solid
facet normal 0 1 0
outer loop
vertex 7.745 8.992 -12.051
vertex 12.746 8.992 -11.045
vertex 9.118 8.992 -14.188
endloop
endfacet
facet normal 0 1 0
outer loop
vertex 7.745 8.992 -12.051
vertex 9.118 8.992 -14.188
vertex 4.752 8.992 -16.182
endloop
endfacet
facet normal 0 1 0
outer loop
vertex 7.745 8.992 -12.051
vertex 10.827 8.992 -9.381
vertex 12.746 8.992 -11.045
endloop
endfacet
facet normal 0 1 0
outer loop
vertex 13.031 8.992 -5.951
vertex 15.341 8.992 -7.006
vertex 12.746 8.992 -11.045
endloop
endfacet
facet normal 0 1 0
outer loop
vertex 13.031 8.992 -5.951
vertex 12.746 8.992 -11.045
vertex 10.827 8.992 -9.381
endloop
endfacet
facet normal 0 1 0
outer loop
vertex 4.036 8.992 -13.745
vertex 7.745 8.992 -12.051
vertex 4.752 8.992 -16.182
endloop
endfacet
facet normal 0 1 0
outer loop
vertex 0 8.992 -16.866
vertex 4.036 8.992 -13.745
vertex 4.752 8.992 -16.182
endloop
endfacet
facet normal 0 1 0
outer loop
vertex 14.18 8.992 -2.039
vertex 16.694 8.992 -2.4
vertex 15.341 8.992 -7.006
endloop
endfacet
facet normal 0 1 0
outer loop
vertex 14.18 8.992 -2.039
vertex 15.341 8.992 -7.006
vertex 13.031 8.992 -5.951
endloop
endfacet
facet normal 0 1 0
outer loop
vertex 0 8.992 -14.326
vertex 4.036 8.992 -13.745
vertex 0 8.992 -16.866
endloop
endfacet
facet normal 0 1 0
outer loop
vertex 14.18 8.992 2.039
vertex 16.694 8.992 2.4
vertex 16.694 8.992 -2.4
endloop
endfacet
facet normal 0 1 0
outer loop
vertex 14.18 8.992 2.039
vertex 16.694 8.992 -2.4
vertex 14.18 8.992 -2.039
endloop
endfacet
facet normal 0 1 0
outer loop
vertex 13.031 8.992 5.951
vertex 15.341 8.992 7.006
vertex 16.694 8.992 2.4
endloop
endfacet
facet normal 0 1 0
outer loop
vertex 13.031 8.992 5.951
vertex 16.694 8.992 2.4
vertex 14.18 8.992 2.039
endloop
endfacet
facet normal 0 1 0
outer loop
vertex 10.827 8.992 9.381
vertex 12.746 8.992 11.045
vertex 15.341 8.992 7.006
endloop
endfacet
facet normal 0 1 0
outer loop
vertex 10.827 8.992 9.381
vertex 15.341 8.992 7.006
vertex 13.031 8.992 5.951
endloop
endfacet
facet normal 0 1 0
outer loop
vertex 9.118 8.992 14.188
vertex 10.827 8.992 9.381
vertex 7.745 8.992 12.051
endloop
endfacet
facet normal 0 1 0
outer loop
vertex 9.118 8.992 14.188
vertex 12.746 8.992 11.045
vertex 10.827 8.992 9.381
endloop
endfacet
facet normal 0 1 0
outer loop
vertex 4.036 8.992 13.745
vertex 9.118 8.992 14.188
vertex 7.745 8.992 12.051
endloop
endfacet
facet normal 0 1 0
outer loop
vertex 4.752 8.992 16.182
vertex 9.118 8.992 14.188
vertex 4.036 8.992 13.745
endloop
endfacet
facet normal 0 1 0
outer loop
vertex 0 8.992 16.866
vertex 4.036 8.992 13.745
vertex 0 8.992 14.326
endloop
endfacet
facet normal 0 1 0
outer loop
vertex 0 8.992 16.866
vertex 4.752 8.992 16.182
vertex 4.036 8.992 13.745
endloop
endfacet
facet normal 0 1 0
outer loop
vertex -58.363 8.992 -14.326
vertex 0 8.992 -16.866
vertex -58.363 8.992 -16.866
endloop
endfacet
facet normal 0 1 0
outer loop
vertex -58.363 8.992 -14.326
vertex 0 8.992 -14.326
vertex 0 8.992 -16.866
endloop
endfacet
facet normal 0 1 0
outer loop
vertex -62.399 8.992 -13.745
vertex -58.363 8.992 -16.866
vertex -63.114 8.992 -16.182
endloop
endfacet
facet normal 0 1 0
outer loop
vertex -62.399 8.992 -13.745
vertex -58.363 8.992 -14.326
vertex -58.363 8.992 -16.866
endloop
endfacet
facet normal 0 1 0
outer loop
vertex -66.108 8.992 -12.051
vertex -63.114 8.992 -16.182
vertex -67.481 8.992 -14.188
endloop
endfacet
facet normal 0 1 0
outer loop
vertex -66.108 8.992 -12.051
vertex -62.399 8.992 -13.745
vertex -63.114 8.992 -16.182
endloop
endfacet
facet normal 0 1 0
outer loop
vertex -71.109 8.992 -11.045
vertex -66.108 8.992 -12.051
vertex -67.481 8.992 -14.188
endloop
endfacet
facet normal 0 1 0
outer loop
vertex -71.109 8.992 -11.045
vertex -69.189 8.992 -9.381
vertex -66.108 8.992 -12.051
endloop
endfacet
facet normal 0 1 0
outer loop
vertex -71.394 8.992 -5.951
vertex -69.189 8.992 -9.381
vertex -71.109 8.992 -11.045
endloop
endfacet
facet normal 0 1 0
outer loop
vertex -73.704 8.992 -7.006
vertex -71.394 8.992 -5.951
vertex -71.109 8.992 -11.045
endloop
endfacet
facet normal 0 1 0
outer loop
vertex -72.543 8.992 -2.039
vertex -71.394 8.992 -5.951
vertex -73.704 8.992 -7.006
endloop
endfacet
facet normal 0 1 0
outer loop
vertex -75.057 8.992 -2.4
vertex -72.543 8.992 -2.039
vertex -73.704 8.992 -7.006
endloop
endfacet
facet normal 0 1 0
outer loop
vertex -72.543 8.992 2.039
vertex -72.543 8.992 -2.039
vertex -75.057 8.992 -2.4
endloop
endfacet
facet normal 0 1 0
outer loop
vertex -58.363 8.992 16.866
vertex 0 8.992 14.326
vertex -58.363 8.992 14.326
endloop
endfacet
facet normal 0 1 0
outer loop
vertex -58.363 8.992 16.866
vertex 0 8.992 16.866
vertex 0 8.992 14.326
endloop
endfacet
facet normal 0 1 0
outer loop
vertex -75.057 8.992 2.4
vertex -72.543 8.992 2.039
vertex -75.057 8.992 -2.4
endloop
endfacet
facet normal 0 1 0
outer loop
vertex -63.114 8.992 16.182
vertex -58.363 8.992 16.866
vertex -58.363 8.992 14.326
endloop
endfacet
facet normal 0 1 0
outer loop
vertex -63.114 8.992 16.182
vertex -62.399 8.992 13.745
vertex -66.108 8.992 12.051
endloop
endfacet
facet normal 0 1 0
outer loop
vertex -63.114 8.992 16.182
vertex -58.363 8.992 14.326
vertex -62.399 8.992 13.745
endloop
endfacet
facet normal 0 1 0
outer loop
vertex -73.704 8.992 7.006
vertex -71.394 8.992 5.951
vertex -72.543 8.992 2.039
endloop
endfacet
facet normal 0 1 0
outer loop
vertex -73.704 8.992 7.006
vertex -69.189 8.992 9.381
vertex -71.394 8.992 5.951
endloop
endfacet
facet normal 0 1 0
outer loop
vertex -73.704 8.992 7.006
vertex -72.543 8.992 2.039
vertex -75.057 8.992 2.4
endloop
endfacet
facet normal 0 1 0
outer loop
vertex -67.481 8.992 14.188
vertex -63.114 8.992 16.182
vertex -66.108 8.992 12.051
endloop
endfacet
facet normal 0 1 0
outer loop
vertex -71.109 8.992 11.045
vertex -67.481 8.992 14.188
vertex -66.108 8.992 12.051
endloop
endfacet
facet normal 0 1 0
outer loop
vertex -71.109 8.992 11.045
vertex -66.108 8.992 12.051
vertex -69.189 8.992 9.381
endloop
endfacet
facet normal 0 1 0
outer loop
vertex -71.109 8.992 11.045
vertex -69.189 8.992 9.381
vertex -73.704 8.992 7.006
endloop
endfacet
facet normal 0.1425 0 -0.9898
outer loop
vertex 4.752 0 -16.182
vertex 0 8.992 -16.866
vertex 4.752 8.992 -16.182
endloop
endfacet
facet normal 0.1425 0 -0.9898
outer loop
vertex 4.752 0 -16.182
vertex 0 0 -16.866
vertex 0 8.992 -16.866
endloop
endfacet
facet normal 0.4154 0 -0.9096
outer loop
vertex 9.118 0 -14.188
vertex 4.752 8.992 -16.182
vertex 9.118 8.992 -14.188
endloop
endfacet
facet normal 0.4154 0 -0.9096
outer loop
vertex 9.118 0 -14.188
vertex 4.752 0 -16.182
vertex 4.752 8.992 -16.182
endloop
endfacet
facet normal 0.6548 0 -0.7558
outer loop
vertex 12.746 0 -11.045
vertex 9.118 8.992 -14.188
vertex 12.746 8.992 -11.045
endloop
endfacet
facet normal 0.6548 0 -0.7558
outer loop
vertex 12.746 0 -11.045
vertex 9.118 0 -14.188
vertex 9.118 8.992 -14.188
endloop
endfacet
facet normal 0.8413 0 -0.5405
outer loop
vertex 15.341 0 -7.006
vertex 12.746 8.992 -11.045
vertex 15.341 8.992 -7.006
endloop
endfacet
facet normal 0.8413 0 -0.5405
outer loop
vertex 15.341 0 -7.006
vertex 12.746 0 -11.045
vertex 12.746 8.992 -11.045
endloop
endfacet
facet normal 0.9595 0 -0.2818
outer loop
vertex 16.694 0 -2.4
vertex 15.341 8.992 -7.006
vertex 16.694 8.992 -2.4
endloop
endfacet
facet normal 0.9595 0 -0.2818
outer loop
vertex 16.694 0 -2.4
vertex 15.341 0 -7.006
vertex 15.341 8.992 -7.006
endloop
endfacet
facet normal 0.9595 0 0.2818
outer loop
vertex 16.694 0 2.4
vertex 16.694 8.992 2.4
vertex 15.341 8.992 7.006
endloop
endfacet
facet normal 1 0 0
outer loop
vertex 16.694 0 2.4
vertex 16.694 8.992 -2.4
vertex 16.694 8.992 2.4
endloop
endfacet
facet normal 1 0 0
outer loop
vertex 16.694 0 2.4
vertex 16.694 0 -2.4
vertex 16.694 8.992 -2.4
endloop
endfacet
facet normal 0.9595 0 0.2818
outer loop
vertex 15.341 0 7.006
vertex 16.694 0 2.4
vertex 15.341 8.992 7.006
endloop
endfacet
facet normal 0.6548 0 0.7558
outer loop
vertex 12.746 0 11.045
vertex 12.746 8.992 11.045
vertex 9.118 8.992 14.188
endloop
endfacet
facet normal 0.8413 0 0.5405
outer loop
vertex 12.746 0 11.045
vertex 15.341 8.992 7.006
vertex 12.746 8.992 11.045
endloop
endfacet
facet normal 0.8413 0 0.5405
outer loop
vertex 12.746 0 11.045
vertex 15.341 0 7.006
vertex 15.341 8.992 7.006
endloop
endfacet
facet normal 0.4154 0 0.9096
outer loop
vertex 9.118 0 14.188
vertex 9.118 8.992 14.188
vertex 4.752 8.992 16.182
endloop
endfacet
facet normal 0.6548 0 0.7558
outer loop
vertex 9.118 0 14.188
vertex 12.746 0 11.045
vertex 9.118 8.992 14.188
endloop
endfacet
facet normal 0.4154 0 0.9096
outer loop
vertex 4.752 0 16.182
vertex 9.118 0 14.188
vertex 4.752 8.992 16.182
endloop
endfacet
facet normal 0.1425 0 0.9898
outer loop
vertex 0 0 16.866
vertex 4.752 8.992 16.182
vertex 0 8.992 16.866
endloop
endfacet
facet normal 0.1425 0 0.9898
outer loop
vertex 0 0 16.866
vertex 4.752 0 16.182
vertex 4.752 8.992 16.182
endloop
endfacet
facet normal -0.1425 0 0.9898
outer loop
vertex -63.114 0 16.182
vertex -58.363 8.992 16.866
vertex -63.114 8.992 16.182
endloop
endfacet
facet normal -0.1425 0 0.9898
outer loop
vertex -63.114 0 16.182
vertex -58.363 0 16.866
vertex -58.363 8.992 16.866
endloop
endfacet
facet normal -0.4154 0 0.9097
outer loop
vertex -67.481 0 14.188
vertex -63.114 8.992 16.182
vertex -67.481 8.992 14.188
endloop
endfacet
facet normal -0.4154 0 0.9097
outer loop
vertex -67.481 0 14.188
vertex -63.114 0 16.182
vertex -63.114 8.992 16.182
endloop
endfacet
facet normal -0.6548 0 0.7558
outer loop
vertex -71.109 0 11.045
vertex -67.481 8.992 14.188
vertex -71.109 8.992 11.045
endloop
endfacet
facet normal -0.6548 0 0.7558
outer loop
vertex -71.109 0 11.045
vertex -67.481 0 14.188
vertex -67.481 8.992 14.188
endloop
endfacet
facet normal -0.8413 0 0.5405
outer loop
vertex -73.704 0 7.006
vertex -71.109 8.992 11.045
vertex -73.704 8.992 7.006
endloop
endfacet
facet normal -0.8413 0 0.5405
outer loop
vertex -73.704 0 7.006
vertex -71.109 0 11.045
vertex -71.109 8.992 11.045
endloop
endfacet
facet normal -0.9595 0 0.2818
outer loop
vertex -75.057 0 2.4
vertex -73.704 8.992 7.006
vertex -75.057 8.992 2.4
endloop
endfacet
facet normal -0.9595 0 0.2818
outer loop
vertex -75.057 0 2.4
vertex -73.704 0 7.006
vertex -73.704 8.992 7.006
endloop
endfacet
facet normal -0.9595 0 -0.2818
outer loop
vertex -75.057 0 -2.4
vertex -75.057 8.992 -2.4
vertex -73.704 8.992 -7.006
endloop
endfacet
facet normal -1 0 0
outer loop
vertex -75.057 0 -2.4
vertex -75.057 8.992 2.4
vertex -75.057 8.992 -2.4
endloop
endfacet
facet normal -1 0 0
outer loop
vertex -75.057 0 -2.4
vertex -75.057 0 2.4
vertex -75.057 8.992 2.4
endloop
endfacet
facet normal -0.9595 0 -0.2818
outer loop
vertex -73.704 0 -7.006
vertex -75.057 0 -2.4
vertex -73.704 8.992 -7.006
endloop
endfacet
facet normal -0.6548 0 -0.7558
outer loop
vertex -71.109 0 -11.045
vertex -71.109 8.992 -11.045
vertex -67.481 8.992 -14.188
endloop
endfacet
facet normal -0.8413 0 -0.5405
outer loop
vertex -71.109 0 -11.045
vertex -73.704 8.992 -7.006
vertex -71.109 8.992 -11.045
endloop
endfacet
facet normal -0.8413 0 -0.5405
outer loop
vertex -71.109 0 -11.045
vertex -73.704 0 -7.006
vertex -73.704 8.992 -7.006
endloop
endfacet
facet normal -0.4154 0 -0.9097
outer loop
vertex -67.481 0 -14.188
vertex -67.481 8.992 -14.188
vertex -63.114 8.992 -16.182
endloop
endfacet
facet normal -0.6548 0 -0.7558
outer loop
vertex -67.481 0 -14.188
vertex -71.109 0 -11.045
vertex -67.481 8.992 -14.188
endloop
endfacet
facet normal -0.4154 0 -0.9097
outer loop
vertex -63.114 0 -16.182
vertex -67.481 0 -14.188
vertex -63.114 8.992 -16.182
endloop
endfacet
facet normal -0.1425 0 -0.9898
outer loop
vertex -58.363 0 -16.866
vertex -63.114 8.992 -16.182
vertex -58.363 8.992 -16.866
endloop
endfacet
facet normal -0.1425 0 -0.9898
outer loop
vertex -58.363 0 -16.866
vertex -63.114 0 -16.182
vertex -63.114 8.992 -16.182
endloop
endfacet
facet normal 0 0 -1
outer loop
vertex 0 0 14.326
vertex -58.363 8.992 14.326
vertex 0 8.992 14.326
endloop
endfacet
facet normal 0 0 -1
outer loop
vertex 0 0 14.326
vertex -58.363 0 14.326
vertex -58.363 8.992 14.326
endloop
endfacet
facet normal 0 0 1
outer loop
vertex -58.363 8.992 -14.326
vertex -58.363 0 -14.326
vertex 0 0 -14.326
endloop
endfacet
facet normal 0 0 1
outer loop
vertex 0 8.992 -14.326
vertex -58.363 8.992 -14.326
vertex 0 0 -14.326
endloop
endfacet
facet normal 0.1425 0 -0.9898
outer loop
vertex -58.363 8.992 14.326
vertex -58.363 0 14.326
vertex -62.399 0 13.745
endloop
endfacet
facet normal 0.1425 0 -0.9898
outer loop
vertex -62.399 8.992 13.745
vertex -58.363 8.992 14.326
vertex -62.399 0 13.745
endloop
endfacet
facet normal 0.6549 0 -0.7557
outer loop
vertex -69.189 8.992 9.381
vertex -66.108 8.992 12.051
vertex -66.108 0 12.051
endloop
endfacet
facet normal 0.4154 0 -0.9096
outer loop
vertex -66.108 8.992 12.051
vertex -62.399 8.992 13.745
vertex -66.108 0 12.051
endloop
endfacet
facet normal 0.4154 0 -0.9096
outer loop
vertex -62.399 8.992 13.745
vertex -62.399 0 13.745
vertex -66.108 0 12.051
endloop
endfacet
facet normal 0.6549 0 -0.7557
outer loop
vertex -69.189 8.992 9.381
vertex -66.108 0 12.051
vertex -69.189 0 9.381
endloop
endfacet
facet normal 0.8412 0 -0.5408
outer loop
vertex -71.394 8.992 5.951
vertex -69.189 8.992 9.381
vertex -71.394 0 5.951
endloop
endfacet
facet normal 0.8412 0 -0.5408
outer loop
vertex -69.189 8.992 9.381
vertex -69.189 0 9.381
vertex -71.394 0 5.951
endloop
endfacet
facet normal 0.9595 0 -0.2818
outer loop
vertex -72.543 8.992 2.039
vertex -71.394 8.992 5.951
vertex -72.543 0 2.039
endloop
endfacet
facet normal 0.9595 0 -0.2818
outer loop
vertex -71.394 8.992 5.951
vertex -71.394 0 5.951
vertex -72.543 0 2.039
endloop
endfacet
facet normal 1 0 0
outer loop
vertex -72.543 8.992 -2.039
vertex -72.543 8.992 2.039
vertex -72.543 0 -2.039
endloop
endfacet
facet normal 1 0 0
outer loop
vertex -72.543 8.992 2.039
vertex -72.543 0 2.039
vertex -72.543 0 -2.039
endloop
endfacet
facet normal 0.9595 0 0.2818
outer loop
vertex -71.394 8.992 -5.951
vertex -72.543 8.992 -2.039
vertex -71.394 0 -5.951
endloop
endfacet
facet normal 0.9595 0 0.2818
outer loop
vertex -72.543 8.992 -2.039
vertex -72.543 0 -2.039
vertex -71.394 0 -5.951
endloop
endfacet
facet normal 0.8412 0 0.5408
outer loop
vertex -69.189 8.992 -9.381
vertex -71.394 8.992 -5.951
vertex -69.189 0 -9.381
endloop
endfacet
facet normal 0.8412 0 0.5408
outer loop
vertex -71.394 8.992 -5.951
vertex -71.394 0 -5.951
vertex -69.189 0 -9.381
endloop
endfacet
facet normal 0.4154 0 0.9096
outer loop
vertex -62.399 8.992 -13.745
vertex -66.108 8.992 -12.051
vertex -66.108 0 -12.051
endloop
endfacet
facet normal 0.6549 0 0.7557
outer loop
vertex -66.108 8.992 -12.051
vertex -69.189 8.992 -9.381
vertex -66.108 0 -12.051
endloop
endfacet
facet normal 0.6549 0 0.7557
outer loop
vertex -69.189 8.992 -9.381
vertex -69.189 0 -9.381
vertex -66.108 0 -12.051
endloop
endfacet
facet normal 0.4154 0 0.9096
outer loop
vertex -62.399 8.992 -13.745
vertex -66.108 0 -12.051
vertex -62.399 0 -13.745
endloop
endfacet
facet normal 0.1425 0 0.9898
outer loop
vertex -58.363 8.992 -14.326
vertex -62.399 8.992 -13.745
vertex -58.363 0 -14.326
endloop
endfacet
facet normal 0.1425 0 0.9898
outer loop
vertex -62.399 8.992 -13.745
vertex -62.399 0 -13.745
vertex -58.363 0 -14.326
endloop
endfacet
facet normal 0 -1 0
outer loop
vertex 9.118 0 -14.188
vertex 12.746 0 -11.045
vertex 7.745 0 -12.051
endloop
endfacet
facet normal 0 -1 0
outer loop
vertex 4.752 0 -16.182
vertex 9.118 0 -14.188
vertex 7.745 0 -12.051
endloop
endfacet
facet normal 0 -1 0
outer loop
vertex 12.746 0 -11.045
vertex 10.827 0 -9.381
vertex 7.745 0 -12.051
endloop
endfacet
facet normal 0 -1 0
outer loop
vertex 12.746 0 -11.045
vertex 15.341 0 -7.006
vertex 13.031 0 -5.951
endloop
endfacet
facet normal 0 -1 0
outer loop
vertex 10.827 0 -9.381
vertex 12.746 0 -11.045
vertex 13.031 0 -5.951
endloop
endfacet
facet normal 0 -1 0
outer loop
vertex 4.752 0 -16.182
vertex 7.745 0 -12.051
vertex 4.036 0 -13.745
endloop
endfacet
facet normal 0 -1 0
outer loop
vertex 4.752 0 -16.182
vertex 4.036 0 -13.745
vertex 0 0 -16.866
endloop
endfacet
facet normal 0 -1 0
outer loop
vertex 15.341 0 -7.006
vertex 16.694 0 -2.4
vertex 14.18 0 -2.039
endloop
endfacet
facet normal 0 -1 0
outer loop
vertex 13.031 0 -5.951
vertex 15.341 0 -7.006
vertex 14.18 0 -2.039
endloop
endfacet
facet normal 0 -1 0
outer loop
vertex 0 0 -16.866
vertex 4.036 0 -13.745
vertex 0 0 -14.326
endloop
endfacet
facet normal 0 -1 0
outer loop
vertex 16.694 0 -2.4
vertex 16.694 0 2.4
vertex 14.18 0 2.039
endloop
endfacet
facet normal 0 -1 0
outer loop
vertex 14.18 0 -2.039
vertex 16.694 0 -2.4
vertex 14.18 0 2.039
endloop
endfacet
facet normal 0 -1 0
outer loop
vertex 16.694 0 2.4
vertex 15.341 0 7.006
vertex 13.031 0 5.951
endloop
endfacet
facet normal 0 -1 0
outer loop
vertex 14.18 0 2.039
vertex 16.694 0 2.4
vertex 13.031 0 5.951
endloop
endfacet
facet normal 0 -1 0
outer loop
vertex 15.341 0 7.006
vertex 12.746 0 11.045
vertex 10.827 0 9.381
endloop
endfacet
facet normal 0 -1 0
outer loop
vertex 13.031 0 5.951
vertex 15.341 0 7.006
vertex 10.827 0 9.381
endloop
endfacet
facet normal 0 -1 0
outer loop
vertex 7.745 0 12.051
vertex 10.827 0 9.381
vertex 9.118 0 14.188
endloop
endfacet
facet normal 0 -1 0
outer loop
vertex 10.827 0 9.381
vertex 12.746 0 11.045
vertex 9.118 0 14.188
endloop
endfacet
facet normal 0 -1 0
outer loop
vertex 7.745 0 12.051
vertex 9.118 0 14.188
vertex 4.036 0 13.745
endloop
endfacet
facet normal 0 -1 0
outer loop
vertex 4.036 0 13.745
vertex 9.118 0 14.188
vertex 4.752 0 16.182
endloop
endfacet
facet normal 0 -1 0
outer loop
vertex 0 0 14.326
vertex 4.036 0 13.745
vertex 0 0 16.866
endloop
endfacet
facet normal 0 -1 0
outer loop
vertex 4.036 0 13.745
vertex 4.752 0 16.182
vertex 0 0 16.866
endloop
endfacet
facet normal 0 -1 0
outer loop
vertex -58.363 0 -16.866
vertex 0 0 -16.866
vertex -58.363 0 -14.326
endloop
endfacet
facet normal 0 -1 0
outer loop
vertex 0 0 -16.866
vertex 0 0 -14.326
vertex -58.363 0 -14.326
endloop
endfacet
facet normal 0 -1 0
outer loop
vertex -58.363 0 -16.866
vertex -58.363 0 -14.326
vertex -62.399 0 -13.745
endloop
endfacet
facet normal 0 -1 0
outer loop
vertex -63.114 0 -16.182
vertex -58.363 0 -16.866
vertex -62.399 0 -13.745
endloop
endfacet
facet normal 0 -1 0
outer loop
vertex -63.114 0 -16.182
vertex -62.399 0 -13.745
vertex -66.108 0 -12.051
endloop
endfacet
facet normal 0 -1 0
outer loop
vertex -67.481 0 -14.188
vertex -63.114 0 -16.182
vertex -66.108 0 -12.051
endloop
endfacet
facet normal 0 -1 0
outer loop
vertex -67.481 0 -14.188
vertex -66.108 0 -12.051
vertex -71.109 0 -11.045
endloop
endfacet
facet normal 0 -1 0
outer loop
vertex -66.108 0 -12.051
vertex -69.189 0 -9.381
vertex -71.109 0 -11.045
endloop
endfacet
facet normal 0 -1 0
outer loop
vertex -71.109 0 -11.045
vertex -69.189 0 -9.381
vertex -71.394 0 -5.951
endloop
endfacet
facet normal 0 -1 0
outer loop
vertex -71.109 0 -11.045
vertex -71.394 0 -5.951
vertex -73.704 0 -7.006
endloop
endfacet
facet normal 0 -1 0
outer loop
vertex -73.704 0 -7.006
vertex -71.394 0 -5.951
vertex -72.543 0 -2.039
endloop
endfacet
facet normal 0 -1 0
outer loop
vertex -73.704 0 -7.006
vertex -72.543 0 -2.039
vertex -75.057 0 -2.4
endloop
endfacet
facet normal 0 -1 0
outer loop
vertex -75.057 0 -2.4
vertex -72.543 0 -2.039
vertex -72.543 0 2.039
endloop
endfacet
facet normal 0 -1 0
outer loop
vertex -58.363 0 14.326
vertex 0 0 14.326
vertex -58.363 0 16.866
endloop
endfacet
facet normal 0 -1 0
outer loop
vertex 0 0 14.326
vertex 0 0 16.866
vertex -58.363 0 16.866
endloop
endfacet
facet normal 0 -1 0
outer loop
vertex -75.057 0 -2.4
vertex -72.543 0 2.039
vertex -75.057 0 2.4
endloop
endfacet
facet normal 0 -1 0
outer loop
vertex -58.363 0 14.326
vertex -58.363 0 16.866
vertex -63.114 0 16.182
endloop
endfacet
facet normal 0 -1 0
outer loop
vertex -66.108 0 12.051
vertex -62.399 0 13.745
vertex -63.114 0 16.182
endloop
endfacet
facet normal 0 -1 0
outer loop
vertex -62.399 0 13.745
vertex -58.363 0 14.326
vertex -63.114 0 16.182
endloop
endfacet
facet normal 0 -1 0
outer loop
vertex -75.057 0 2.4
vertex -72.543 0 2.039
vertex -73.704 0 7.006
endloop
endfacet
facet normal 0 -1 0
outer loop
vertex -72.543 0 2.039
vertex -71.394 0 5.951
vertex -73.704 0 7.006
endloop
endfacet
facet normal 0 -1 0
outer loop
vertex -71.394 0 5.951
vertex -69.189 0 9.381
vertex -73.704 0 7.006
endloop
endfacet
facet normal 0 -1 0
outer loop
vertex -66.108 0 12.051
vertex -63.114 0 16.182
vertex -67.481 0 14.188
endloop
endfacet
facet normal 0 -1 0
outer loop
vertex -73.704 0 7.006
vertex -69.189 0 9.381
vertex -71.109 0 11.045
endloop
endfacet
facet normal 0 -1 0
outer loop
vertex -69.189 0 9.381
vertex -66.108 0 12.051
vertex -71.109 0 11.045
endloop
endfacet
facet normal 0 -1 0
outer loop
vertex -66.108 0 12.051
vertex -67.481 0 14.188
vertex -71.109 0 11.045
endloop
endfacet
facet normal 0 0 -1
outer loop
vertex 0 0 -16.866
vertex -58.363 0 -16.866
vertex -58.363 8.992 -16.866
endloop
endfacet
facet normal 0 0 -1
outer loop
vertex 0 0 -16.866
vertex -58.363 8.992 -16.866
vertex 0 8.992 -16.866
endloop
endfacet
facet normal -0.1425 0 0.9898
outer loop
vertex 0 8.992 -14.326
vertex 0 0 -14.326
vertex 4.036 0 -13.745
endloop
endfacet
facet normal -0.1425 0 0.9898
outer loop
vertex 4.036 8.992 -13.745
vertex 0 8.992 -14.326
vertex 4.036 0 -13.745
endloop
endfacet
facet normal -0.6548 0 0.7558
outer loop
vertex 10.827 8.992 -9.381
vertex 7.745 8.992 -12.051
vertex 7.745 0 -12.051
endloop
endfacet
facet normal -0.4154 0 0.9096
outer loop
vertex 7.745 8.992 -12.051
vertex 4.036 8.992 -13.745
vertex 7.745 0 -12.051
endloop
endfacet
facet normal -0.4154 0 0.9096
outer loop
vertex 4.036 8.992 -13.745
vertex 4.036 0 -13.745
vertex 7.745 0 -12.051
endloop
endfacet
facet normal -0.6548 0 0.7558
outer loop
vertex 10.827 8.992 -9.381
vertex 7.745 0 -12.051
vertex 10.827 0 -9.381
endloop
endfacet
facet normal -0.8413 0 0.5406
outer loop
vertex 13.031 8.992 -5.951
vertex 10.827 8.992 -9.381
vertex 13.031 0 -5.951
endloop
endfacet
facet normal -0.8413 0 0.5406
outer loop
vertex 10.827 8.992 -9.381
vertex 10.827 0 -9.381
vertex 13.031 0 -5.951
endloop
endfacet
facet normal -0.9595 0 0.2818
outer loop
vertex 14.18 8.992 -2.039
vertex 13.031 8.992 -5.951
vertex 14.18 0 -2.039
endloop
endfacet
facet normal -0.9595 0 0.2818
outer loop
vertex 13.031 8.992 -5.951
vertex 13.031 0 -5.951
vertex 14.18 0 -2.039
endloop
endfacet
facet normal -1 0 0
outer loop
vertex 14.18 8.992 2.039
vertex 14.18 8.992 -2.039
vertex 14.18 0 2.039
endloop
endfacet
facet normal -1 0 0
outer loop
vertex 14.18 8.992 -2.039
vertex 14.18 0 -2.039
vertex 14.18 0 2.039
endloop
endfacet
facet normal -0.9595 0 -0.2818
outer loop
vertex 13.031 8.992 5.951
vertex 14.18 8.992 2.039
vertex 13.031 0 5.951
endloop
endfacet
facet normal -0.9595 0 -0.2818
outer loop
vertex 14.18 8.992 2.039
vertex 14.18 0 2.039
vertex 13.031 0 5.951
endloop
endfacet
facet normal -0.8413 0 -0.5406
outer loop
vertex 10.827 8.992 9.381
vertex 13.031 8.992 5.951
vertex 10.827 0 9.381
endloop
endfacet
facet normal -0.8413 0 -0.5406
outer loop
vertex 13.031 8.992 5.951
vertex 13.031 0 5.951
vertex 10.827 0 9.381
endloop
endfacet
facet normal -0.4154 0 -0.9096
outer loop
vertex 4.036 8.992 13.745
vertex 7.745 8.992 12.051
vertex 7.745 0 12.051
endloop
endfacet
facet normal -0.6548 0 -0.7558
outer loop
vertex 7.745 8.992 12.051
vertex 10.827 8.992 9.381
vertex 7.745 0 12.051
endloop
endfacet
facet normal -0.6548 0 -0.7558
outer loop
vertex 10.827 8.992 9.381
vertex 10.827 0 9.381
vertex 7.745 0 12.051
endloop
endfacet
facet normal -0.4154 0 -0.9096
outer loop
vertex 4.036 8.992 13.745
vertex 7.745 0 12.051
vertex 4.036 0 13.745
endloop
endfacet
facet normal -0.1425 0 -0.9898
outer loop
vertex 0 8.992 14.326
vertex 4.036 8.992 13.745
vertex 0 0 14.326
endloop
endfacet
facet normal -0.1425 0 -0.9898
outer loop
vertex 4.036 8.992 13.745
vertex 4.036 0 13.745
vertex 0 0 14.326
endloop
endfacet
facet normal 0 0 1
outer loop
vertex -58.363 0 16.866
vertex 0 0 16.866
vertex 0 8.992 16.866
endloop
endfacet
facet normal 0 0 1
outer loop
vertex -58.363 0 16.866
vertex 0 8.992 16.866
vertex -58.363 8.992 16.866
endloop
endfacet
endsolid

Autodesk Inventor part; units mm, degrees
ref_plane "YZ Plane" through (0, 0, 0) normal (1, 0, 0) x (0, 1, 0)
ref_plane "XZ Plane" through (0, 0, 0) normal (0, 1, 0) x (-1, 0, 0)
ref_plane "XY Plane" through (0, 0, 0) normal (0, 0, 1) x (1, 0, 0)
sketch "Sketch1" plane through (0, 0, 0) normal (0, 1, 0) x (-1, 0, 0)
  circle A0 centre (0, 0) radius 14.3256 construction
  line L0 (0, 0) -> (58.3628, 0) construction
  circle A1 centre (58.3628, 0) radius 14.3256 construction
  line L1 (58.3628, 14.3256) -> (0, 14.3256)
  line L2 (58.3628, -14.3256) -> (0, -14.3256)
  arc A2 (58.3628, -14.3256) -> (58.3628, 14.3256) centre (58.3628, 0) ccw
  arc A3 (0, 14.3256) -> (0, -14.3256) centre (0, 0) ccw
  line L3 (0, 16.8656) -> (58.3628, 16.8656)
  arc A4 (58.3628, -16.8656) -> (58.3628, 16.8656) centre (58.3628, 0) ccw
  line L4 (58.3628, -16.8656) -> (0, -16.8656)
  arc A5 (0, 16.8656) -> (0, -16.8656) centre (0, 0) ccw
  dimension "d0" = 28.6512
  dimension "d1" = 58.3628
  dimension "d2" = 28.6512
  dimension "d3" = 2.54
extrude "Extrusion1" add sketch "Sketch1" along normal blind 8.9916
properties part number "INTK_013_Belt5" material "Rubber, Silicone"
